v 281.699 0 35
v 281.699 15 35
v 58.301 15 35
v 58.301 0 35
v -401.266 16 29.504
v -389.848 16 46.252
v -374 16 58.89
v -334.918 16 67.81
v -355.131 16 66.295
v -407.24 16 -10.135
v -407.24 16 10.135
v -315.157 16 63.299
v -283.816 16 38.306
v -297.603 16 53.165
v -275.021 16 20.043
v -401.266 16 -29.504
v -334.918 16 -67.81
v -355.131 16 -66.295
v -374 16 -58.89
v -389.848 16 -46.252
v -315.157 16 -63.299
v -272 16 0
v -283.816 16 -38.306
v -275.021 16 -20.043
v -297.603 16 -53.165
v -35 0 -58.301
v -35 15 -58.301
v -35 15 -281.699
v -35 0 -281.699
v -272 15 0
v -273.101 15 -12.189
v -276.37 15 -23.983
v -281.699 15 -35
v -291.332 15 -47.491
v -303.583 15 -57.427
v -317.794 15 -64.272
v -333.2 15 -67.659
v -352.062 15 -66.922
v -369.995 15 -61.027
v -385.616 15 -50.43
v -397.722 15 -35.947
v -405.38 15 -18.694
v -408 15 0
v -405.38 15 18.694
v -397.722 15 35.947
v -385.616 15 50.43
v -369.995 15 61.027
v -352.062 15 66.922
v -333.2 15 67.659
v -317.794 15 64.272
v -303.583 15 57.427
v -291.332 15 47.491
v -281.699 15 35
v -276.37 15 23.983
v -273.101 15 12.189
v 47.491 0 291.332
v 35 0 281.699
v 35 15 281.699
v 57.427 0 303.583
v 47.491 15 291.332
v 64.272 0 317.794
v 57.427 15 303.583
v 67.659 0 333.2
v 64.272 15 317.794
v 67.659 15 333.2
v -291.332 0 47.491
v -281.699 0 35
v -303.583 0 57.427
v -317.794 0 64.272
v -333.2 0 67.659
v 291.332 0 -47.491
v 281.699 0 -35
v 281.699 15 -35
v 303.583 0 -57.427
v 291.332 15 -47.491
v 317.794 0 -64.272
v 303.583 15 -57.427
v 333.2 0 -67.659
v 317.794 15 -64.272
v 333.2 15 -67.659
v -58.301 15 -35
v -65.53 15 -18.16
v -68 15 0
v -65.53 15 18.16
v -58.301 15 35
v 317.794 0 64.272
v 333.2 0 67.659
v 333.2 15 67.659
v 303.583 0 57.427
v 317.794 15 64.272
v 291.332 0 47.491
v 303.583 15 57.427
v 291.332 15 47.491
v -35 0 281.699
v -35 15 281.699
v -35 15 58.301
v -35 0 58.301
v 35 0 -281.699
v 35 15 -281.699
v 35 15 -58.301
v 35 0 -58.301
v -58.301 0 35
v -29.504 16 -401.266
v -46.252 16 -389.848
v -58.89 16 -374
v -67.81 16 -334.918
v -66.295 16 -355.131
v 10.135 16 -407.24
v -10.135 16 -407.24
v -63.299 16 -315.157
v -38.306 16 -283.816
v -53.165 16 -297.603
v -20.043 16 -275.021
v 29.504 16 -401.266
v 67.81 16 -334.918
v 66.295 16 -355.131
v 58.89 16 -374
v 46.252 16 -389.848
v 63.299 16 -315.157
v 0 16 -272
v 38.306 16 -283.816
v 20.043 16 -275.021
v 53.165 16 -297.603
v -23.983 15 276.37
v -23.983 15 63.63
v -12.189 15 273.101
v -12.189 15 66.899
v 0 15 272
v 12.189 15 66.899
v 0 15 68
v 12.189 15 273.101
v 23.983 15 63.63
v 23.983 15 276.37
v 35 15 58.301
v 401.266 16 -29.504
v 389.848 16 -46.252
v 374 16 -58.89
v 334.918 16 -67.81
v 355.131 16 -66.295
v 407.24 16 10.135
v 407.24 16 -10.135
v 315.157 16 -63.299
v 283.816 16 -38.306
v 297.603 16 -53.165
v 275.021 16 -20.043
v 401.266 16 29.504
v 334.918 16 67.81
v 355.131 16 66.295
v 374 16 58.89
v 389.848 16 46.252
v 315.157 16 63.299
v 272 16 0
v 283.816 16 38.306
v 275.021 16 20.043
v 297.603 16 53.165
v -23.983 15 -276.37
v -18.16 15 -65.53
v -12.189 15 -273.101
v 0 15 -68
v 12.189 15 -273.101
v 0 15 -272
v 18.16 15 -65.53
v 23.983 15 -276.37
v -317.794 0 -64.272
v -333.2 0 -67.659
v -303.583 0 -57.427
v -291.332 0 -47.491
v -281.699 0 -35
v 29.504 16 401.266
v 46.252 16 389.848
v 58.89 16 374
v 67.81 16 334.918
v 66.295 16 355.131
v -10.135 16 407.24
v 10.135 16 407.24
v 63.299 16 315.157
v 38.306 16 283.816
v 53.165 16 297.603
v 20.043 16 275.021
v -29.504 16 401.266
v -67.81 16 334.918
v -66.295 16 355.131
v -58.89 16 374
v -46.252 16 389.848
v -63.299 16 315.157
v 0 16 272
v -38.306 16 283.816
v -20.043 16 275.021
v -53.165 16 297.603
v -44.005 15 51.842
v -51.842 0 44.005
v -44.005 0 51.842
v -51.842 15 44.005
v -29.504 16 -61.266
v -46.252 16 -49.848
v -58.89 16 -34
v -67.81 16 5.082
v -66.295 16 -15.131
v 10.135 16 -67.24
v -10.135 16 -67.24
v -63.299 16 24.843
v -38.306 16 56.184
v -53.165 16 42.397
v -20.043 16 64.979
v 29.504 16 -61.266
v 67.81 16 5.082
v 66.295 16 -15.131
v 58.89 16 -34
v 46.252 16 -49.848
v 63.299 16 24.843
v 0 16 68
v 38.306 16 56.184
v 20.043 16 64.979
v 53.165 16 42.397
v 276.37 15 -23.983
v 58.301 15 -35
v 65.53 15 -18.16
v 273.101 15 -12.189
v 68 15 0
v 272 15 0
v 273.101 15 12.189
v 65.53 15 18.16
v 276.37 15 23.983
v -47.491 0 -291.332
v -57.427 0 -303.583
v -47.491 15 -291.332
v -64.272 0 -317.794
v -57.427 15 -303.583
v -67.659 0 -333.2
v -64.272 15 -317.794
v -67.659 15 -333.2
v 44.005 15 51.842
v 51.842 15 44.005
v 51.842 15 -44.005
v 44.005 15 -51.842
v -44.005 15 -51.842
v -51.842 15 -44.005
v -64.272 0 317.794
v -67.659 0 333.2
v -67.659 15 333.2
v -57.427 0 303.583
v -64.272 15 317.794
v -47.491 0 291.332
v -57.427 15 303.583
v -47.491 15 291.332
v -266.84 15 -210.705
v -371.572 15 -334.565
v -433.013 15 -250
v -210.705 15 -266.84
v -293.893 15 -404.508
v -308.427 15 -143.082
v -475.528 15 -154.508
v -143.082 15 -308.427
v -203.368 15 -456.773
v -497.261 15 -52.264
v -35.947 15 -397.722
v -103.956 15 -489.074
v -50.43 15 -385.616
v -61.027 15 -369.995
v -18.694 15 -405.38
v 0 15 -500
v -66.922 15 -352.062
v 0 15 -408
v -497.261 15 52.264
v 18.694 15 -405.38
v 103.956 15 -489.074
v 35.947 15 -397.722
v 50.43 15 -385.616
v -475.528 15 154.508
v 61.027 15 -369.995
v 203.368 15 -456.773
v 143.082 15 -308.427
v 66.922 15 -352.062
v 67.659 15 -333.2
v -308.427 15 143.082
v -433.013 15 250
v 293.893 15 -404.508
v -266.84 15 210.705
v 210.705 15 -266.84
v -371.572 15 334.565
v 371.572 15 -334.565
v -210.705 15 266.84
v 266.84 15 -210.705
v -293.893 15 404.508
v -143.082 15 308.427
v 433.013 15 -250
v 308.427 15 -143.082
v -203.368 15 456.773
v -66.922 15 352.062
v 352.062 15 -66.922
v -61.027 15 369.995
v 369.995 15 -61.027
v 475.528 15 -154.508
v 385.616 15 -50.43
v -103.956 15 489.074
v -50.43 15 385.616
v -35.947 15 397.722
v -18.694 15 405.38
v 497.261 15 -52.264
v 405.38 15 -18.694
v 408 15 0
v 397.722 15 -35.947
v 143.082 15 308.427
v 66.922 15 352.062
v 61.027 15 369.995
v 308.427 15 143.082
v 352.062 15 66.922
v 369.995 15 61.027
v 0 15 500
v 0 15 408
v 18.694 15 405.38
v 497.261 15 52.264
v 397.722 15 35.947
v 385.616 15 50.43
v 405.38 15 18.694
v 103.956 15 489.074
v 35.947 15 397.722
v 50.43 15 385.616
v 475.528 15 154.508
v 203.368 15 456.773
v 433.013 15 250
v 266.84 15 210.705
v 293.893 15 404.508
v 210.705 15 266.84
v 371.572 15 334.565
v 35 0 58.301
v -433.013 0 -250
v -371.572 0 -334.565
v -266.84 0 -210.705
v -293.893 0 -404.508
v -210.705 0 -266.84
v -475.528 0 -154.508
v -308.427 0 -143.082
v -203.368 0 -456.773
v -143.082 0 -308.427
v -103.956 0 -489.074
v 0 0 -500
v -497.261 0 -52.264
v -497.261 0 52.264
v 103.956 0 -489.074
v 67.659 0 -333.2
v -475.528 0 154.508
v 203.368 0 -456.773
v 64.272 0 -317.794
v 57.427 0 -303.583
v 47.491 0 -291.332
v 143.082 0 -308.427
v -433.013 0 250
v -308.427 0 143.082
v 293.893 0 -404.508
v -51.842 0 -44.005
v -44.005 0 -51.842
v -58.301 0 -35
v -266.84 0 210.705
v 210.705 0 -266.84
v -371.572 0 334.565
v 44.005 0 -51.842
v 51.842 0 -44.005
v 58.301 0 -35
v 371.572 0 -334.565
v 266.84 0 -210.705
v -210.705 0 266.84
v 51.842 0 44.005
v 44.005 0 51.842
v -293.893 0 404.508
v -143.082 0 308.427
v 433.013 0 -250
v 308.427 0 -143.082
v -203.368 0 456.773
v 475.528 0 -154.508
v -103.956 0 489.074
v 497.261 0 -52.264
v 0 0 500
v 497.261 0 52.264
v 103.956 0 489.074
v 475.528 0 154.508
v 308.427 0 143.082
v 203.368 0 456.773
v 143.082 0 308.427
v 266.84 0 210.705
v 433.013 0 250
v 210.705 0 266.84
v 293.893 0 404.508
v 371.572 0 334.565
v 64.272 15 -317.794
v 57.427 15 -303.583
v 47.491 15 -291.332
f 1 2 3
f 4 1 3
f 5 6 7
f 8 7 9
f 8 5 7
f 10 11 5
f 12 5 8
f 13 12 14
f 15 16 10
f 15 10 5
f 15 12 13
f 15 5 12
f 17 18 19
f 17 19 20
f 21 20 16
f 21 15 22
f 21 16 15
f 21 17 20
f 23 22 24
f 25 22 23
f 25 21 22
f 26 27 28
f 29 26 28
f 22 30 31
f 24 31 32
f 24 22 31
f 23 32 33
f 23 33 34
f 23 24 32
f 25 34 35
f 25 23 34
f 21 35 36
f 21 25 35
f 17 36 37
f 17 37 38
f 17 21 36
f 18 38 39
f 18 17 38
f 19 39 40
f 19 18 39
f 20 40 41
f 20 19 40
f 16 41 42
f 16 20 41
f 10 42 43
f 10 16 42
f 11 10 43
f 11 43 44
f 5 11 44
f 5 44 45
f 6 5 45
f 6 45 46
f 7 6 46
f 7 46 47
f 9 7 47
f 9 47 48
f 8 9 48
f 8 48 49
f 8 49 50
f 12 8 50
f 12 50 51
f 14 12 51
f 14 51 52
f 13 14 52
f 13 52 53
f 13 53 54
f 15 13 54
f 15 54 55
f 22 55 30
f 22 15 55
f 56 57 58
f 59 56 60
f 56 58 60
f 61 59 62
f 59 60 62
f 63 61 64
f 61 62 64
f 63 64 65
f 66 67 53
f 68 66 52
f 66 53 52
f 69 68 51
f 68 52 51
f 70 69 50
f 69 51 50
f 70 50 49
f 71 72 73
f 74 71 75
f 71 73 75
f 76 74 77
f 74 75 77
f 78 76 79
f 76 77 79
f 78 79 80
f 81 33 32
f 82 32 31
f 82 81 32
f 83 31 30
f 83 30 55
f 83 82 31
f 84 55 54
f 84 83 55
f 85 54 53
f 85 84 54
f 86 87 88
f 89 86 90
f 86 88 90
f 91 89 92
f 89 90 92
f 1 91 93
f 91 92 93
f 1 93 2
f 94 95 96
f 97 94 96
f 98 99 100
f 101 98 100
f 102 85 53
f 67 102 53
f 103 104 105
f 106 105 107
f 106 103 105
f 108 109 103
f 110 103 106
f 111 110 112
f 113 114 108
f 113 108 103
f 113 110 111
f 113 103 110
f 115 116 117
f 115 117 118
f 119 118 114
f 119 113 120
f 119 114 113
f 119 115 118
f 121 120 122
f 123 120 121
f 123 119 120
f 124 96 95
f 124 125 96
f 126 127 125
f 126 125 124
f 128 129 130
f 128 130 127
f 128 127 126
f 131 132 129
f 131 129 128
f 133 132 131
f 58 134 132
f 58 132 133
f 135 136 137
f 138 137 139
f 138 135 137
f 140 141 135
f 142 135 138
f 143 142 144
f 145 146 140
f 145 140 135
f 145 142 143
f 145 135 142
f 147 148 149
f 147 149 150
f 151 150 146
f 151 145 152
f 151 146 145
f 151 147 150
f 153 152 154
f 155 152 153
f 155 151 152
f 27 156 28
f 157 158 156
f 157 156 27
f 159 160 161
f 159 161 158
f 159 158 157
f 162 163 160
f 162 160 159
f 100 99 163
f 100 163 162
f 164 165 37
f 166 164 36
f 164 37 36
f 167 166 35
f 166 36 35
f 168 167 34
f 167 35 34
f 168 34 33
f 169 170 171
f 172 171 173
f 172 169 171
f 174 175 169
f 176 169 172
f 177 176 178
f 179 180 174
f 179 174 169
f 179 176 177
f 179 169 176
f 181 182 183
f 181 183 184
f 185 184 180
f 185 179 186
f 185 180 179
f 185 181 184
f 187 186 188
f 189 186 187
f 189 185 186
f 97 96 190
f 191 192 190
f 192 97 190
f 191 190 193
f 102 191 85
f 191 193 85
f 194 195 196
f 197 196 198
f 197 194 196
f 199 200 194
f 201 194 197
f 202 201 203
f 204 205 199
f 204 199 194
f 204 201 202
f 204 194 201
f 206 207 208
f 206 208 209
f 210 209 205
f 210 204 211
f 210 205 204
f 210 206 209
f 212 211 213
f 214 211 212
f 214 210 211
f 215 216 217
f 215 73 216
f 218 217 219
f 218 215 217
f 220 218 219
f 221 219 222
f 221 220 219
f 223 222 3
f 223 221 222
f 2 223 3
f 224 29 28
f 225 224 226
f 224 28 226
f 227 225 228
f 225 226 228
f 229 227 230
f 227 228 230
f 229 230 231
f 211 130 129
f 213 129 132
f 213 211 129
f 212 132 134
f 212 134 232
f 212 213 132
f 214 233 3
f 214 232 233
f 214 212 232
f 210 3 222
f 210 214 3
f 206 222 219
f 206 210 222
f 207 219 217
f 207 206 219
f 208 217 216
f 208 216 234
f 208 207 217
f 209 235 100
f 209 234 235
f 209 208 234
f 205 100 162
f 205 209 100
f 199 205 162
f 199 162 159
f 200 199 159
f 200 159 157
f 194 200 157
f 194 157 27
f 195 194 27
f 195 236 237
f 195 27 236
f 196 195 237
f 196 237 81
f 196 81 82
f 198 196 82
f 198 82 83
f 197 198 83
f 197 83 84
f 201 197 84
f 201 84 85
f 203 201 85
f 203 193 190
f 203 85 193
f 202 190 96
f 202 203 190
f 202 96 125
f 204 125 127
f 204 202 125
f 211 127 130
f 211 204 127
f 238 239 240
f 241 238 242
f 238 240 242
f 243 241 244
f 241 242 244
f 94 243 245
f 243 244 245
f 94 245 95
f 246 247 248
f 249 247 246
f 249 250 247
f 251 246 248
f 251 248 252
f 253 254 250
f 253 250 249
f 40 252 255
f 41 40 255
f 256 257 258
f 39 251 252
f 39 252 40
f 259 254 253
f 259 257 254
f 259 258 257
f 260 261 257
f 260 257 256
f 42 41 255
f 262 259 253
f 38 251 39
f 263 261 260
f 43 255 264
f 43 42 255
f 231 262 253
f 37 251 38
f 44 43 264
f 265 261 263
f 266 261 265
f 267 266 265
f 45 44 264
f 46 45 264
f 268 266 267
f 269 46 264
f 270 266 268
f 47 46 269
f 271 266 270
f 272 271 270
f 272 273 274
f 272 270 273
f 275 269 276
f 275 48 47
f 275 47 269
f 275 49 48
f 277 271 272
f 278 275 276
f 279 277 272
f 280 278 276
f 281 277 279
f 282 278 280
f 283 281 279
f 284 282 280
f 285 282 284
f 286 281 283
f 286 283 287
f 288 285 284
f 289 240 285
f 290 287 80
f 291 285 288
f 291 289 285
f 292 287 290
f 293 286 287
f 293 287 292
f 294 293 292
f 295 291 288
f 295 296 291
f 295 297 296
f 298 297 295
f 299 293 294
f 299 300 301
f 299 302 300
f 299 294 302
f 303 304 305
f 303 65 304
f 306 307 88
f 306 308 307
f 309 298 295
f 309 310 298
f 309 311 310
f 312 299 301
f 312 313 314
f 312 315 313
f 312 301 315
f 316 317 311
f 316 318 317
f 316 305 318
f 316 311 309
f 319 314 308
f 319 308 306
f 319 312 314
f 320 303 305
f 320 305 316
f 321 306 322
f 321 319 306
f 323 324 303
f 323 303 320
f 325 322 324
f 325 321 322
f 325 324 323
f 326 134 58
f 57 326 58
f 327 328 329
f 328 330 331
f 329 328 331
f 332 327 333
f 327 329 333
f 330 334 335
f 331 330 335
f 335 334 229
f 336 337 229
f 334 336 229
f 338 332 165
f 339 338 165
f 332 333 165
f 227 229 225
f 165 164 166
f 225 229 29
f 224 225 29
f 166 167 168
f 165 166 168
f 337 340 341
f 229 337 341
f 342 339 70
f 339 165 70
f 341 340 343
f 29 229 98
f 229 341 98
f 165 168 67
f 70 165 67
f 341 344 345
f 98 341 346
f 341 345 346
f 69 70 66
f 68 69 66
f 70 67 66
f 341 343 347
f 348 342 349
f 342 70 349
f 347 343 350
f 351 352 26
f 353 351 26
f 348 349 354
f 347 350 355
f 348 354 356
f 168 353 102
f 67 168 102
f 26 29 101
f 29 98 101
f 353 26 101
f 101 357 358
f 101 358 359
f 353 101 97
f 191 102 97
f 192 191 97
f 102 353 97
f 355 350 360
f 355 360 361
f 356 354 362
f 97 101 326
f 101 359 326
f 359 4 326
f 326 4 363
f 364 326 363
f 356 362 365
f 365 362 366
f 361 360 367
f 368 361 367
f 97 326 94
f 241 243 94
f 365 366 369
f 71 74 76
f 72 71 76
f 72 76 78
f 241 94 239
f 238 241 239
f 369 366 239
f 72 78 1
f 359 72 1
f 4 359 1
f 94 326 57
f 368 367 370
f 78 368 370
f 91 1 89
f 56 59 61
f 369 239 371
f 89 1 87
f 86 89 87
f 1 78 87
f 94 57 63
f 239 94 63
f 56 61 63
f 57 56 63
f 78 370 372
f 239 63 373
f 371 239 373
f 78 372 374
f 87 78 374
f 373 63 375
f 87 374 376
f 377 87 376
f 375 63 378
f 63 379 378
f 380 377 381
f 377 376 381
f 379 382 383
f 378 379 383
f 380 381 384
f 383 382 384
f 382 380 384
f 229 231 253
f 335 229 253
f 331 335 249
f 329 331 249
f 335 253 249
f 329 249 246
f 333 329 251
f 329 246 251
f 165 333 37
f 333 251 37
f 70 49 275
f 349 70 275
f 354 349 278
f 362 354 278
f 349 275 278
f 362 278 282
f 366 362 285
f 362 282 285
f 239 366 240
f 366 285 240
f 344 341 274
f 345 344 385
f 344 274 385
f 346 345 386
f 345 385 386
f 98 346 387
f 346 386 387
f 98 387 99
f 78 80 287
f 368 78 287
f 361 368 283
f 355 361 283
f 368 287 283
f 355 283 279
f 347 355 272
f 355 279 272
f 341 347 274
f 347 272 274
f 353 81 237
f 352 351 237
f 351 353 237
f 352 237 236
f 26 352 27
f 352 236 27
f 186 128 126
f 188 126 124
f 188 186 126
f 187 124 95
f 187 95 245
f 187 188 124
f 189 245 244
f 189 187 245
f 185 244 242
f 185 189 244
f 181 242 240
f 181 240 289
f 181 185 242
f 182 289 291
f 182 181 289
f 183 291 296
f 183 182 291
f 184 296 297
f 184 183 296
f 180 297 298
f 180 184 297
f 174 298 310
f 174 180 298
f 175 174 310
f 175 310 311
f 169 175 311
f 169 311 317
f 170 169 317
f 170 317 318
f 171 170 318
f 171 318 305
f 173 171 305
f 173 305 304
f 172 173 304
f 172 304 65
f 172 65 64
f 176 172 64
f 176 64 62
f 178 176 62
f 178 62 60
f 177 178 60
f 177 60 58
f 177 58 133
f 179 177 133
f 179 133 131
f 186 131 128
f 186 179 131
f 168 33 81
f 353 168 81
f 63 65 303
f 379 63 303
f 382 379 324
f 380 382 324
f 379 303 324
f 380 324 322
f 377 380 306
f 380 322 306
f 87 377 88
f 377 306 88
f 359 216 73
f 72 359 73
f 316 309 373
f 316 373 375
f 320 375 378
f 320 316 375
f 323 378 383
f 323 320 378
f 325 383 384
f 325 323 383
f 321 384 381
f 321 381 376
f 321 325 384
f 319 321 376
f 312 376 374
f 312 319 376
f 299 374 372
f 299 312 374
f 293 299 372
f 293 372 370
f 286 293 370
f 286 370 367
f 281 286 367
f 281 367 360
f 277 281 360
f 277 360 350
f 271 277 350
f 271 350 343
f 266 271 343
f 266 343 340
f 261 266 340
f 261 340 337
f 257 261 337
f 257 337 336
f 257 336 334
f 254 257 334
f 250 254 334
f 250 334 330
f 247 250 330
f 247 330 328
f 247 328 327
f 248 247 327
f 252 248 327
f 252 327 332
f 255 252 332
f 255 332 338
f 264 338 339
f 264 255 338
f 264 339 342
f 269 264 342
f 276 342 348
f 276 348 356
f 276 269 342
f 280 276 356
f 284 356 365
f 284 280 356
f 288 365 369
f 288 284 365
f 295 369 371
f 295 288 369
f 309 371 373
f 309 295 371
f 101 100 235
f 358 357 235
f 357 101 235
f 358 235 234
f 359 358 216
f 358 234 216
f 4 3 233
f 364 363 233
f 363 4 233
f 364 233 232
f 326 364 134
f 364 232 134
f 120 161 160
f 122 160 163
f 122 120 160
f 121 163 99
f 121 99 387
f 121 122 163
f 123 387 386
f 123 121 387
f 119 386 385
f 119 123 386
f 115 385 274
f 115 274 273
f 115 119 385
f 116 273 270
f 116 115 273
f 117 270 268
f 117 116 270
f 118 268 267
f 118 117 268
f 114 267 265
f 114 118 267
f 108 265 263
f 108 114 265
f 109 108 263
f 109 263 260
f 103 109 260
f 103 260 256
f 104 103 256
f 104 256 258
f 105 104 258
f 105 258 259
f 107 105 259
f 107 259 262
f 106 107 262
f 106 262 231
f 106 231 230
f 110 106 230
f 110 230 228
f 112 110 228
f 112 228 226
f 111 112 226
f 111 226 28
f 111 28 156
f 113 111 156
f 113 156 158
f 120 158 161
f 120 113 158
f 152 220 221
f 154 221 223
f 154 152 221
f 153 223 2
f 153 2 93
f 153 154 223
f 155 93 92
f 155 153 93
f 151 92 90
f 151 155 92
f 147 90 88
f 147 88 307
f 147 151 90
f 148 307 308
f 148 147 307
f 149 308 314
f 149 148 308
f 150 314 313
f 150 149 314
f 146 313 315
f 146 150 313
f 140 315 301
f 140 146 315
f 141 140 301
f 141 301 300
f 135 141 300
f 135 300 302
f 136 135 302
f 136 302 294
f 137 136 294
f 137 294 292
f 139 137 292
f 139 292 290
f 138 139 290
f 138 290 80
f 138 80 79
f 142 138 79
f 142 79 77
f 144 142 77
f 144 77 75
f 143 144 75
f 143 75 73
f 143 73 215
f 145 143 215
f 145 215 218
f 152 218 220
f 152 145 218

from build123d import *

# Parameters (mm, degrees)
SKETCH2_R           = 550
BOSS_EXTRUDE1_DEPTH = 15
SKETCH3_OUTSIDE_W   = 1413.142
SKETCH3_OUTSIDE_H   = 1413.142
SKETCH3_OUTSIDE_R   = 500
CUT_EXTRUDE1_DEPTH  = 30
BOSS_EXTRUDE2_START = 1
SKETCH4_R           = 68
BOSS_EXTRUDE2_DEPTH = 1
CIRPATTERN1_COUNT   = 4
BOSS_EXTRUDE3_START = 1
SKETCH5_R           = 68
BOSS_EXTRUDE3_DEPTH = 1


with BuildPart() as part:
    # Sketch2 → Boss-Extrude1 (new body)
    with BuildSketch(Plane(origin=(0, 0, 0), x_dir=(1, 0, 0), z_dir=(0, 1, 0))):
        with Locations(Location((0, 0, 0), (0, 0, 270))):
            Circle(SKETCH2_R)
    extrude(amount=BOSS_EXTRUDE1_DEPTH)

    # Sketch3 outside → Cut-Extrude1 (cut)
    # profile 1 of 5: a face of its own
    with BuildSketch(Plane(origin=(0, 15, 0), x_dir=(1, 0, 0), z_dir=(0, 1, 0))):
        Rectangle(SKETCH3_OUTSIDE_W, SKETCH3_OUTSIDE_H)
        with Locations(Location((0, 0, 0), (0, 0, 270))):
            Circle(SKETCH3_OUTSIDE_R, mode=Mode.SUBTRACT)
    # profile 2 of 5: a face of its own
    with BuildSketch(Plane(origin=(0, 15, 0), x_dir=(1, 0, 0), z_dir=(0, 1, 0))):
        with BuildLine():
            Line((-35, 58.300943389), (-35, 281.699056611))
            ThreePointArc((-35, 281.699056611), (-57.426577842, 303.583133614), (-67.659145723, 333.2))
            ThreePointArc((-67.659145723, 333.2), (-240.416305603, 240.416305603), (-333.2, 67.659145723))
            ThreePointArc((-333.2, 67.659145723), (-303.583133614, 57.426577842), (-281.699056611, 35))
            Line((-281.699056611, 35), (-58.300943389, 35))
            ThreePointArc((-58.300943389, 35), (-48.083261121, 48.083261121), (-35, 58.300943389))
        make_face()
    # profile 3 of 5: a face of its own
    with BuildSketch(Plane(origin=(0, 15, 0), x_dir=(1, 0, 0), z_dir=(0, 1, 0))):
        with BuildLine():
            Line((35, 281.699056611), (35, 58.300943389))
            ThreePointArc((35, 58.300943389), (48.083261121, 48.083261121), (58.300943389, 35))
            Line((58.300943389, 35), (281.699056611, 35))
            ThreePointArc((281.699056611, 35), (303.583133614, 57.426577842), (333.2, 67.659145723))
            ThreePointArc((333.2, 67.659145723), (240.416305603, 240.416305603), (67.659145723, 333.2))
            ThreePointArc((67.659145723, 333.2), (57.426577842, 303.583133614), (35, 281.699056611))
        make_face()
    # profile 4 of 5: a face of its own
    with BuildSketch(Plane(origin=(0, 15, 0), x_dir=(1, 0, 0), z_dir=(0, 1, 0))):
        with BuildLine():
            Line((281.699056611, -35), (58.300943389, -35))
            ThreePointArc((58.300943389, -35), (48.083261121, -48.083261121), (35, -58.300943389))
            Line((35, -58.300943389), (35, -281.699056611))
            ThreePointArc((35, -281.699056611), (57.426577842, -303.583133614), (67.659145723, -333.2))
            ThreePointArc((67.659145723, -333.2), (240.416305603, -240.416305603), (333.2, -67.659145723))
            ThreePointArc((333.2, -67.659145723), (303.583133614, -57.426577842), (281.699056611, -35))
        make_face()
    # profile 5 of 5: a face of its own
    with BuildSketch(Plane(origin=(0, 15, 0), x_dir=(1, 0, 0), z_dir=(0, 1, 0))):
        with BuildLine():
            Line((-35, -281.699056611), (-35, -58.300943389))
            ThreePointArc((-35, -58.300943389), (-48.083261121, -48.083261121), (-58.300943389, -35))
            Line((-58.300943389, -35), (-281.699056611, -35))
            ThreePointArc((-281.699056611, -35), (-303.583133614, -57.426577842), (-333.2, -67.659145723))
            ThreePointArc((-333.2, -67.659145723), (-240.416305603, -240.416305603), (-67.659145723, -333.2))
            ThreePointArc((-67.659145723, -333.2), (-57.426577842, -303.583133614), (-35, -281.699056611))
        make_face()
    extrude(amount=-CUT_EXTRUDE1_DEPTH, mode=Mode.SUBTRACT)

    # Sketch4 → Boss-Extrude2 (add)
    with BuildSketch(Plane(origin=(0, 15, 0), x_dir=(1, 0, 0), z_dir=(0, 1, 0)).offset(BOSS_EXTRUDE2_START)):
        with Locations(Location((0, 340, 0), (0, 0, 270))):
            Circle(SKETCH4_R)
    boss_extrude2 = extrude(amount=-BOSS_EXTRUDE2_DEPTH)

    # CirPattern1: Boss-Extrude2 ×4 about axis
    cirpattern1_axis = Axis((0, 15, 0), (0, 1, 0))
    for i in range(1, CIRPATTERN1_COUNT):
        add(boss_extrude2.rotate(cirpattern1_axis, i * 360 / CIRPATTERN1_COUNT))

    # Sketch5 → Boss-Extrude3 (add)
    with BuildSketch(Plane(origin=(0, 15, 0), x_dir=(1, 0, 0), z_dir=(0, 1, 0)).offset(BOSS_EXTRUDE3_START)):
        with Locations(Location((0, 0, 0), (0, 0, 270))):
            Circle(SKETCH5_R)
    extrude(amount=-BOSS_EXTRUDE3_DEPTH)


solid = part.part
